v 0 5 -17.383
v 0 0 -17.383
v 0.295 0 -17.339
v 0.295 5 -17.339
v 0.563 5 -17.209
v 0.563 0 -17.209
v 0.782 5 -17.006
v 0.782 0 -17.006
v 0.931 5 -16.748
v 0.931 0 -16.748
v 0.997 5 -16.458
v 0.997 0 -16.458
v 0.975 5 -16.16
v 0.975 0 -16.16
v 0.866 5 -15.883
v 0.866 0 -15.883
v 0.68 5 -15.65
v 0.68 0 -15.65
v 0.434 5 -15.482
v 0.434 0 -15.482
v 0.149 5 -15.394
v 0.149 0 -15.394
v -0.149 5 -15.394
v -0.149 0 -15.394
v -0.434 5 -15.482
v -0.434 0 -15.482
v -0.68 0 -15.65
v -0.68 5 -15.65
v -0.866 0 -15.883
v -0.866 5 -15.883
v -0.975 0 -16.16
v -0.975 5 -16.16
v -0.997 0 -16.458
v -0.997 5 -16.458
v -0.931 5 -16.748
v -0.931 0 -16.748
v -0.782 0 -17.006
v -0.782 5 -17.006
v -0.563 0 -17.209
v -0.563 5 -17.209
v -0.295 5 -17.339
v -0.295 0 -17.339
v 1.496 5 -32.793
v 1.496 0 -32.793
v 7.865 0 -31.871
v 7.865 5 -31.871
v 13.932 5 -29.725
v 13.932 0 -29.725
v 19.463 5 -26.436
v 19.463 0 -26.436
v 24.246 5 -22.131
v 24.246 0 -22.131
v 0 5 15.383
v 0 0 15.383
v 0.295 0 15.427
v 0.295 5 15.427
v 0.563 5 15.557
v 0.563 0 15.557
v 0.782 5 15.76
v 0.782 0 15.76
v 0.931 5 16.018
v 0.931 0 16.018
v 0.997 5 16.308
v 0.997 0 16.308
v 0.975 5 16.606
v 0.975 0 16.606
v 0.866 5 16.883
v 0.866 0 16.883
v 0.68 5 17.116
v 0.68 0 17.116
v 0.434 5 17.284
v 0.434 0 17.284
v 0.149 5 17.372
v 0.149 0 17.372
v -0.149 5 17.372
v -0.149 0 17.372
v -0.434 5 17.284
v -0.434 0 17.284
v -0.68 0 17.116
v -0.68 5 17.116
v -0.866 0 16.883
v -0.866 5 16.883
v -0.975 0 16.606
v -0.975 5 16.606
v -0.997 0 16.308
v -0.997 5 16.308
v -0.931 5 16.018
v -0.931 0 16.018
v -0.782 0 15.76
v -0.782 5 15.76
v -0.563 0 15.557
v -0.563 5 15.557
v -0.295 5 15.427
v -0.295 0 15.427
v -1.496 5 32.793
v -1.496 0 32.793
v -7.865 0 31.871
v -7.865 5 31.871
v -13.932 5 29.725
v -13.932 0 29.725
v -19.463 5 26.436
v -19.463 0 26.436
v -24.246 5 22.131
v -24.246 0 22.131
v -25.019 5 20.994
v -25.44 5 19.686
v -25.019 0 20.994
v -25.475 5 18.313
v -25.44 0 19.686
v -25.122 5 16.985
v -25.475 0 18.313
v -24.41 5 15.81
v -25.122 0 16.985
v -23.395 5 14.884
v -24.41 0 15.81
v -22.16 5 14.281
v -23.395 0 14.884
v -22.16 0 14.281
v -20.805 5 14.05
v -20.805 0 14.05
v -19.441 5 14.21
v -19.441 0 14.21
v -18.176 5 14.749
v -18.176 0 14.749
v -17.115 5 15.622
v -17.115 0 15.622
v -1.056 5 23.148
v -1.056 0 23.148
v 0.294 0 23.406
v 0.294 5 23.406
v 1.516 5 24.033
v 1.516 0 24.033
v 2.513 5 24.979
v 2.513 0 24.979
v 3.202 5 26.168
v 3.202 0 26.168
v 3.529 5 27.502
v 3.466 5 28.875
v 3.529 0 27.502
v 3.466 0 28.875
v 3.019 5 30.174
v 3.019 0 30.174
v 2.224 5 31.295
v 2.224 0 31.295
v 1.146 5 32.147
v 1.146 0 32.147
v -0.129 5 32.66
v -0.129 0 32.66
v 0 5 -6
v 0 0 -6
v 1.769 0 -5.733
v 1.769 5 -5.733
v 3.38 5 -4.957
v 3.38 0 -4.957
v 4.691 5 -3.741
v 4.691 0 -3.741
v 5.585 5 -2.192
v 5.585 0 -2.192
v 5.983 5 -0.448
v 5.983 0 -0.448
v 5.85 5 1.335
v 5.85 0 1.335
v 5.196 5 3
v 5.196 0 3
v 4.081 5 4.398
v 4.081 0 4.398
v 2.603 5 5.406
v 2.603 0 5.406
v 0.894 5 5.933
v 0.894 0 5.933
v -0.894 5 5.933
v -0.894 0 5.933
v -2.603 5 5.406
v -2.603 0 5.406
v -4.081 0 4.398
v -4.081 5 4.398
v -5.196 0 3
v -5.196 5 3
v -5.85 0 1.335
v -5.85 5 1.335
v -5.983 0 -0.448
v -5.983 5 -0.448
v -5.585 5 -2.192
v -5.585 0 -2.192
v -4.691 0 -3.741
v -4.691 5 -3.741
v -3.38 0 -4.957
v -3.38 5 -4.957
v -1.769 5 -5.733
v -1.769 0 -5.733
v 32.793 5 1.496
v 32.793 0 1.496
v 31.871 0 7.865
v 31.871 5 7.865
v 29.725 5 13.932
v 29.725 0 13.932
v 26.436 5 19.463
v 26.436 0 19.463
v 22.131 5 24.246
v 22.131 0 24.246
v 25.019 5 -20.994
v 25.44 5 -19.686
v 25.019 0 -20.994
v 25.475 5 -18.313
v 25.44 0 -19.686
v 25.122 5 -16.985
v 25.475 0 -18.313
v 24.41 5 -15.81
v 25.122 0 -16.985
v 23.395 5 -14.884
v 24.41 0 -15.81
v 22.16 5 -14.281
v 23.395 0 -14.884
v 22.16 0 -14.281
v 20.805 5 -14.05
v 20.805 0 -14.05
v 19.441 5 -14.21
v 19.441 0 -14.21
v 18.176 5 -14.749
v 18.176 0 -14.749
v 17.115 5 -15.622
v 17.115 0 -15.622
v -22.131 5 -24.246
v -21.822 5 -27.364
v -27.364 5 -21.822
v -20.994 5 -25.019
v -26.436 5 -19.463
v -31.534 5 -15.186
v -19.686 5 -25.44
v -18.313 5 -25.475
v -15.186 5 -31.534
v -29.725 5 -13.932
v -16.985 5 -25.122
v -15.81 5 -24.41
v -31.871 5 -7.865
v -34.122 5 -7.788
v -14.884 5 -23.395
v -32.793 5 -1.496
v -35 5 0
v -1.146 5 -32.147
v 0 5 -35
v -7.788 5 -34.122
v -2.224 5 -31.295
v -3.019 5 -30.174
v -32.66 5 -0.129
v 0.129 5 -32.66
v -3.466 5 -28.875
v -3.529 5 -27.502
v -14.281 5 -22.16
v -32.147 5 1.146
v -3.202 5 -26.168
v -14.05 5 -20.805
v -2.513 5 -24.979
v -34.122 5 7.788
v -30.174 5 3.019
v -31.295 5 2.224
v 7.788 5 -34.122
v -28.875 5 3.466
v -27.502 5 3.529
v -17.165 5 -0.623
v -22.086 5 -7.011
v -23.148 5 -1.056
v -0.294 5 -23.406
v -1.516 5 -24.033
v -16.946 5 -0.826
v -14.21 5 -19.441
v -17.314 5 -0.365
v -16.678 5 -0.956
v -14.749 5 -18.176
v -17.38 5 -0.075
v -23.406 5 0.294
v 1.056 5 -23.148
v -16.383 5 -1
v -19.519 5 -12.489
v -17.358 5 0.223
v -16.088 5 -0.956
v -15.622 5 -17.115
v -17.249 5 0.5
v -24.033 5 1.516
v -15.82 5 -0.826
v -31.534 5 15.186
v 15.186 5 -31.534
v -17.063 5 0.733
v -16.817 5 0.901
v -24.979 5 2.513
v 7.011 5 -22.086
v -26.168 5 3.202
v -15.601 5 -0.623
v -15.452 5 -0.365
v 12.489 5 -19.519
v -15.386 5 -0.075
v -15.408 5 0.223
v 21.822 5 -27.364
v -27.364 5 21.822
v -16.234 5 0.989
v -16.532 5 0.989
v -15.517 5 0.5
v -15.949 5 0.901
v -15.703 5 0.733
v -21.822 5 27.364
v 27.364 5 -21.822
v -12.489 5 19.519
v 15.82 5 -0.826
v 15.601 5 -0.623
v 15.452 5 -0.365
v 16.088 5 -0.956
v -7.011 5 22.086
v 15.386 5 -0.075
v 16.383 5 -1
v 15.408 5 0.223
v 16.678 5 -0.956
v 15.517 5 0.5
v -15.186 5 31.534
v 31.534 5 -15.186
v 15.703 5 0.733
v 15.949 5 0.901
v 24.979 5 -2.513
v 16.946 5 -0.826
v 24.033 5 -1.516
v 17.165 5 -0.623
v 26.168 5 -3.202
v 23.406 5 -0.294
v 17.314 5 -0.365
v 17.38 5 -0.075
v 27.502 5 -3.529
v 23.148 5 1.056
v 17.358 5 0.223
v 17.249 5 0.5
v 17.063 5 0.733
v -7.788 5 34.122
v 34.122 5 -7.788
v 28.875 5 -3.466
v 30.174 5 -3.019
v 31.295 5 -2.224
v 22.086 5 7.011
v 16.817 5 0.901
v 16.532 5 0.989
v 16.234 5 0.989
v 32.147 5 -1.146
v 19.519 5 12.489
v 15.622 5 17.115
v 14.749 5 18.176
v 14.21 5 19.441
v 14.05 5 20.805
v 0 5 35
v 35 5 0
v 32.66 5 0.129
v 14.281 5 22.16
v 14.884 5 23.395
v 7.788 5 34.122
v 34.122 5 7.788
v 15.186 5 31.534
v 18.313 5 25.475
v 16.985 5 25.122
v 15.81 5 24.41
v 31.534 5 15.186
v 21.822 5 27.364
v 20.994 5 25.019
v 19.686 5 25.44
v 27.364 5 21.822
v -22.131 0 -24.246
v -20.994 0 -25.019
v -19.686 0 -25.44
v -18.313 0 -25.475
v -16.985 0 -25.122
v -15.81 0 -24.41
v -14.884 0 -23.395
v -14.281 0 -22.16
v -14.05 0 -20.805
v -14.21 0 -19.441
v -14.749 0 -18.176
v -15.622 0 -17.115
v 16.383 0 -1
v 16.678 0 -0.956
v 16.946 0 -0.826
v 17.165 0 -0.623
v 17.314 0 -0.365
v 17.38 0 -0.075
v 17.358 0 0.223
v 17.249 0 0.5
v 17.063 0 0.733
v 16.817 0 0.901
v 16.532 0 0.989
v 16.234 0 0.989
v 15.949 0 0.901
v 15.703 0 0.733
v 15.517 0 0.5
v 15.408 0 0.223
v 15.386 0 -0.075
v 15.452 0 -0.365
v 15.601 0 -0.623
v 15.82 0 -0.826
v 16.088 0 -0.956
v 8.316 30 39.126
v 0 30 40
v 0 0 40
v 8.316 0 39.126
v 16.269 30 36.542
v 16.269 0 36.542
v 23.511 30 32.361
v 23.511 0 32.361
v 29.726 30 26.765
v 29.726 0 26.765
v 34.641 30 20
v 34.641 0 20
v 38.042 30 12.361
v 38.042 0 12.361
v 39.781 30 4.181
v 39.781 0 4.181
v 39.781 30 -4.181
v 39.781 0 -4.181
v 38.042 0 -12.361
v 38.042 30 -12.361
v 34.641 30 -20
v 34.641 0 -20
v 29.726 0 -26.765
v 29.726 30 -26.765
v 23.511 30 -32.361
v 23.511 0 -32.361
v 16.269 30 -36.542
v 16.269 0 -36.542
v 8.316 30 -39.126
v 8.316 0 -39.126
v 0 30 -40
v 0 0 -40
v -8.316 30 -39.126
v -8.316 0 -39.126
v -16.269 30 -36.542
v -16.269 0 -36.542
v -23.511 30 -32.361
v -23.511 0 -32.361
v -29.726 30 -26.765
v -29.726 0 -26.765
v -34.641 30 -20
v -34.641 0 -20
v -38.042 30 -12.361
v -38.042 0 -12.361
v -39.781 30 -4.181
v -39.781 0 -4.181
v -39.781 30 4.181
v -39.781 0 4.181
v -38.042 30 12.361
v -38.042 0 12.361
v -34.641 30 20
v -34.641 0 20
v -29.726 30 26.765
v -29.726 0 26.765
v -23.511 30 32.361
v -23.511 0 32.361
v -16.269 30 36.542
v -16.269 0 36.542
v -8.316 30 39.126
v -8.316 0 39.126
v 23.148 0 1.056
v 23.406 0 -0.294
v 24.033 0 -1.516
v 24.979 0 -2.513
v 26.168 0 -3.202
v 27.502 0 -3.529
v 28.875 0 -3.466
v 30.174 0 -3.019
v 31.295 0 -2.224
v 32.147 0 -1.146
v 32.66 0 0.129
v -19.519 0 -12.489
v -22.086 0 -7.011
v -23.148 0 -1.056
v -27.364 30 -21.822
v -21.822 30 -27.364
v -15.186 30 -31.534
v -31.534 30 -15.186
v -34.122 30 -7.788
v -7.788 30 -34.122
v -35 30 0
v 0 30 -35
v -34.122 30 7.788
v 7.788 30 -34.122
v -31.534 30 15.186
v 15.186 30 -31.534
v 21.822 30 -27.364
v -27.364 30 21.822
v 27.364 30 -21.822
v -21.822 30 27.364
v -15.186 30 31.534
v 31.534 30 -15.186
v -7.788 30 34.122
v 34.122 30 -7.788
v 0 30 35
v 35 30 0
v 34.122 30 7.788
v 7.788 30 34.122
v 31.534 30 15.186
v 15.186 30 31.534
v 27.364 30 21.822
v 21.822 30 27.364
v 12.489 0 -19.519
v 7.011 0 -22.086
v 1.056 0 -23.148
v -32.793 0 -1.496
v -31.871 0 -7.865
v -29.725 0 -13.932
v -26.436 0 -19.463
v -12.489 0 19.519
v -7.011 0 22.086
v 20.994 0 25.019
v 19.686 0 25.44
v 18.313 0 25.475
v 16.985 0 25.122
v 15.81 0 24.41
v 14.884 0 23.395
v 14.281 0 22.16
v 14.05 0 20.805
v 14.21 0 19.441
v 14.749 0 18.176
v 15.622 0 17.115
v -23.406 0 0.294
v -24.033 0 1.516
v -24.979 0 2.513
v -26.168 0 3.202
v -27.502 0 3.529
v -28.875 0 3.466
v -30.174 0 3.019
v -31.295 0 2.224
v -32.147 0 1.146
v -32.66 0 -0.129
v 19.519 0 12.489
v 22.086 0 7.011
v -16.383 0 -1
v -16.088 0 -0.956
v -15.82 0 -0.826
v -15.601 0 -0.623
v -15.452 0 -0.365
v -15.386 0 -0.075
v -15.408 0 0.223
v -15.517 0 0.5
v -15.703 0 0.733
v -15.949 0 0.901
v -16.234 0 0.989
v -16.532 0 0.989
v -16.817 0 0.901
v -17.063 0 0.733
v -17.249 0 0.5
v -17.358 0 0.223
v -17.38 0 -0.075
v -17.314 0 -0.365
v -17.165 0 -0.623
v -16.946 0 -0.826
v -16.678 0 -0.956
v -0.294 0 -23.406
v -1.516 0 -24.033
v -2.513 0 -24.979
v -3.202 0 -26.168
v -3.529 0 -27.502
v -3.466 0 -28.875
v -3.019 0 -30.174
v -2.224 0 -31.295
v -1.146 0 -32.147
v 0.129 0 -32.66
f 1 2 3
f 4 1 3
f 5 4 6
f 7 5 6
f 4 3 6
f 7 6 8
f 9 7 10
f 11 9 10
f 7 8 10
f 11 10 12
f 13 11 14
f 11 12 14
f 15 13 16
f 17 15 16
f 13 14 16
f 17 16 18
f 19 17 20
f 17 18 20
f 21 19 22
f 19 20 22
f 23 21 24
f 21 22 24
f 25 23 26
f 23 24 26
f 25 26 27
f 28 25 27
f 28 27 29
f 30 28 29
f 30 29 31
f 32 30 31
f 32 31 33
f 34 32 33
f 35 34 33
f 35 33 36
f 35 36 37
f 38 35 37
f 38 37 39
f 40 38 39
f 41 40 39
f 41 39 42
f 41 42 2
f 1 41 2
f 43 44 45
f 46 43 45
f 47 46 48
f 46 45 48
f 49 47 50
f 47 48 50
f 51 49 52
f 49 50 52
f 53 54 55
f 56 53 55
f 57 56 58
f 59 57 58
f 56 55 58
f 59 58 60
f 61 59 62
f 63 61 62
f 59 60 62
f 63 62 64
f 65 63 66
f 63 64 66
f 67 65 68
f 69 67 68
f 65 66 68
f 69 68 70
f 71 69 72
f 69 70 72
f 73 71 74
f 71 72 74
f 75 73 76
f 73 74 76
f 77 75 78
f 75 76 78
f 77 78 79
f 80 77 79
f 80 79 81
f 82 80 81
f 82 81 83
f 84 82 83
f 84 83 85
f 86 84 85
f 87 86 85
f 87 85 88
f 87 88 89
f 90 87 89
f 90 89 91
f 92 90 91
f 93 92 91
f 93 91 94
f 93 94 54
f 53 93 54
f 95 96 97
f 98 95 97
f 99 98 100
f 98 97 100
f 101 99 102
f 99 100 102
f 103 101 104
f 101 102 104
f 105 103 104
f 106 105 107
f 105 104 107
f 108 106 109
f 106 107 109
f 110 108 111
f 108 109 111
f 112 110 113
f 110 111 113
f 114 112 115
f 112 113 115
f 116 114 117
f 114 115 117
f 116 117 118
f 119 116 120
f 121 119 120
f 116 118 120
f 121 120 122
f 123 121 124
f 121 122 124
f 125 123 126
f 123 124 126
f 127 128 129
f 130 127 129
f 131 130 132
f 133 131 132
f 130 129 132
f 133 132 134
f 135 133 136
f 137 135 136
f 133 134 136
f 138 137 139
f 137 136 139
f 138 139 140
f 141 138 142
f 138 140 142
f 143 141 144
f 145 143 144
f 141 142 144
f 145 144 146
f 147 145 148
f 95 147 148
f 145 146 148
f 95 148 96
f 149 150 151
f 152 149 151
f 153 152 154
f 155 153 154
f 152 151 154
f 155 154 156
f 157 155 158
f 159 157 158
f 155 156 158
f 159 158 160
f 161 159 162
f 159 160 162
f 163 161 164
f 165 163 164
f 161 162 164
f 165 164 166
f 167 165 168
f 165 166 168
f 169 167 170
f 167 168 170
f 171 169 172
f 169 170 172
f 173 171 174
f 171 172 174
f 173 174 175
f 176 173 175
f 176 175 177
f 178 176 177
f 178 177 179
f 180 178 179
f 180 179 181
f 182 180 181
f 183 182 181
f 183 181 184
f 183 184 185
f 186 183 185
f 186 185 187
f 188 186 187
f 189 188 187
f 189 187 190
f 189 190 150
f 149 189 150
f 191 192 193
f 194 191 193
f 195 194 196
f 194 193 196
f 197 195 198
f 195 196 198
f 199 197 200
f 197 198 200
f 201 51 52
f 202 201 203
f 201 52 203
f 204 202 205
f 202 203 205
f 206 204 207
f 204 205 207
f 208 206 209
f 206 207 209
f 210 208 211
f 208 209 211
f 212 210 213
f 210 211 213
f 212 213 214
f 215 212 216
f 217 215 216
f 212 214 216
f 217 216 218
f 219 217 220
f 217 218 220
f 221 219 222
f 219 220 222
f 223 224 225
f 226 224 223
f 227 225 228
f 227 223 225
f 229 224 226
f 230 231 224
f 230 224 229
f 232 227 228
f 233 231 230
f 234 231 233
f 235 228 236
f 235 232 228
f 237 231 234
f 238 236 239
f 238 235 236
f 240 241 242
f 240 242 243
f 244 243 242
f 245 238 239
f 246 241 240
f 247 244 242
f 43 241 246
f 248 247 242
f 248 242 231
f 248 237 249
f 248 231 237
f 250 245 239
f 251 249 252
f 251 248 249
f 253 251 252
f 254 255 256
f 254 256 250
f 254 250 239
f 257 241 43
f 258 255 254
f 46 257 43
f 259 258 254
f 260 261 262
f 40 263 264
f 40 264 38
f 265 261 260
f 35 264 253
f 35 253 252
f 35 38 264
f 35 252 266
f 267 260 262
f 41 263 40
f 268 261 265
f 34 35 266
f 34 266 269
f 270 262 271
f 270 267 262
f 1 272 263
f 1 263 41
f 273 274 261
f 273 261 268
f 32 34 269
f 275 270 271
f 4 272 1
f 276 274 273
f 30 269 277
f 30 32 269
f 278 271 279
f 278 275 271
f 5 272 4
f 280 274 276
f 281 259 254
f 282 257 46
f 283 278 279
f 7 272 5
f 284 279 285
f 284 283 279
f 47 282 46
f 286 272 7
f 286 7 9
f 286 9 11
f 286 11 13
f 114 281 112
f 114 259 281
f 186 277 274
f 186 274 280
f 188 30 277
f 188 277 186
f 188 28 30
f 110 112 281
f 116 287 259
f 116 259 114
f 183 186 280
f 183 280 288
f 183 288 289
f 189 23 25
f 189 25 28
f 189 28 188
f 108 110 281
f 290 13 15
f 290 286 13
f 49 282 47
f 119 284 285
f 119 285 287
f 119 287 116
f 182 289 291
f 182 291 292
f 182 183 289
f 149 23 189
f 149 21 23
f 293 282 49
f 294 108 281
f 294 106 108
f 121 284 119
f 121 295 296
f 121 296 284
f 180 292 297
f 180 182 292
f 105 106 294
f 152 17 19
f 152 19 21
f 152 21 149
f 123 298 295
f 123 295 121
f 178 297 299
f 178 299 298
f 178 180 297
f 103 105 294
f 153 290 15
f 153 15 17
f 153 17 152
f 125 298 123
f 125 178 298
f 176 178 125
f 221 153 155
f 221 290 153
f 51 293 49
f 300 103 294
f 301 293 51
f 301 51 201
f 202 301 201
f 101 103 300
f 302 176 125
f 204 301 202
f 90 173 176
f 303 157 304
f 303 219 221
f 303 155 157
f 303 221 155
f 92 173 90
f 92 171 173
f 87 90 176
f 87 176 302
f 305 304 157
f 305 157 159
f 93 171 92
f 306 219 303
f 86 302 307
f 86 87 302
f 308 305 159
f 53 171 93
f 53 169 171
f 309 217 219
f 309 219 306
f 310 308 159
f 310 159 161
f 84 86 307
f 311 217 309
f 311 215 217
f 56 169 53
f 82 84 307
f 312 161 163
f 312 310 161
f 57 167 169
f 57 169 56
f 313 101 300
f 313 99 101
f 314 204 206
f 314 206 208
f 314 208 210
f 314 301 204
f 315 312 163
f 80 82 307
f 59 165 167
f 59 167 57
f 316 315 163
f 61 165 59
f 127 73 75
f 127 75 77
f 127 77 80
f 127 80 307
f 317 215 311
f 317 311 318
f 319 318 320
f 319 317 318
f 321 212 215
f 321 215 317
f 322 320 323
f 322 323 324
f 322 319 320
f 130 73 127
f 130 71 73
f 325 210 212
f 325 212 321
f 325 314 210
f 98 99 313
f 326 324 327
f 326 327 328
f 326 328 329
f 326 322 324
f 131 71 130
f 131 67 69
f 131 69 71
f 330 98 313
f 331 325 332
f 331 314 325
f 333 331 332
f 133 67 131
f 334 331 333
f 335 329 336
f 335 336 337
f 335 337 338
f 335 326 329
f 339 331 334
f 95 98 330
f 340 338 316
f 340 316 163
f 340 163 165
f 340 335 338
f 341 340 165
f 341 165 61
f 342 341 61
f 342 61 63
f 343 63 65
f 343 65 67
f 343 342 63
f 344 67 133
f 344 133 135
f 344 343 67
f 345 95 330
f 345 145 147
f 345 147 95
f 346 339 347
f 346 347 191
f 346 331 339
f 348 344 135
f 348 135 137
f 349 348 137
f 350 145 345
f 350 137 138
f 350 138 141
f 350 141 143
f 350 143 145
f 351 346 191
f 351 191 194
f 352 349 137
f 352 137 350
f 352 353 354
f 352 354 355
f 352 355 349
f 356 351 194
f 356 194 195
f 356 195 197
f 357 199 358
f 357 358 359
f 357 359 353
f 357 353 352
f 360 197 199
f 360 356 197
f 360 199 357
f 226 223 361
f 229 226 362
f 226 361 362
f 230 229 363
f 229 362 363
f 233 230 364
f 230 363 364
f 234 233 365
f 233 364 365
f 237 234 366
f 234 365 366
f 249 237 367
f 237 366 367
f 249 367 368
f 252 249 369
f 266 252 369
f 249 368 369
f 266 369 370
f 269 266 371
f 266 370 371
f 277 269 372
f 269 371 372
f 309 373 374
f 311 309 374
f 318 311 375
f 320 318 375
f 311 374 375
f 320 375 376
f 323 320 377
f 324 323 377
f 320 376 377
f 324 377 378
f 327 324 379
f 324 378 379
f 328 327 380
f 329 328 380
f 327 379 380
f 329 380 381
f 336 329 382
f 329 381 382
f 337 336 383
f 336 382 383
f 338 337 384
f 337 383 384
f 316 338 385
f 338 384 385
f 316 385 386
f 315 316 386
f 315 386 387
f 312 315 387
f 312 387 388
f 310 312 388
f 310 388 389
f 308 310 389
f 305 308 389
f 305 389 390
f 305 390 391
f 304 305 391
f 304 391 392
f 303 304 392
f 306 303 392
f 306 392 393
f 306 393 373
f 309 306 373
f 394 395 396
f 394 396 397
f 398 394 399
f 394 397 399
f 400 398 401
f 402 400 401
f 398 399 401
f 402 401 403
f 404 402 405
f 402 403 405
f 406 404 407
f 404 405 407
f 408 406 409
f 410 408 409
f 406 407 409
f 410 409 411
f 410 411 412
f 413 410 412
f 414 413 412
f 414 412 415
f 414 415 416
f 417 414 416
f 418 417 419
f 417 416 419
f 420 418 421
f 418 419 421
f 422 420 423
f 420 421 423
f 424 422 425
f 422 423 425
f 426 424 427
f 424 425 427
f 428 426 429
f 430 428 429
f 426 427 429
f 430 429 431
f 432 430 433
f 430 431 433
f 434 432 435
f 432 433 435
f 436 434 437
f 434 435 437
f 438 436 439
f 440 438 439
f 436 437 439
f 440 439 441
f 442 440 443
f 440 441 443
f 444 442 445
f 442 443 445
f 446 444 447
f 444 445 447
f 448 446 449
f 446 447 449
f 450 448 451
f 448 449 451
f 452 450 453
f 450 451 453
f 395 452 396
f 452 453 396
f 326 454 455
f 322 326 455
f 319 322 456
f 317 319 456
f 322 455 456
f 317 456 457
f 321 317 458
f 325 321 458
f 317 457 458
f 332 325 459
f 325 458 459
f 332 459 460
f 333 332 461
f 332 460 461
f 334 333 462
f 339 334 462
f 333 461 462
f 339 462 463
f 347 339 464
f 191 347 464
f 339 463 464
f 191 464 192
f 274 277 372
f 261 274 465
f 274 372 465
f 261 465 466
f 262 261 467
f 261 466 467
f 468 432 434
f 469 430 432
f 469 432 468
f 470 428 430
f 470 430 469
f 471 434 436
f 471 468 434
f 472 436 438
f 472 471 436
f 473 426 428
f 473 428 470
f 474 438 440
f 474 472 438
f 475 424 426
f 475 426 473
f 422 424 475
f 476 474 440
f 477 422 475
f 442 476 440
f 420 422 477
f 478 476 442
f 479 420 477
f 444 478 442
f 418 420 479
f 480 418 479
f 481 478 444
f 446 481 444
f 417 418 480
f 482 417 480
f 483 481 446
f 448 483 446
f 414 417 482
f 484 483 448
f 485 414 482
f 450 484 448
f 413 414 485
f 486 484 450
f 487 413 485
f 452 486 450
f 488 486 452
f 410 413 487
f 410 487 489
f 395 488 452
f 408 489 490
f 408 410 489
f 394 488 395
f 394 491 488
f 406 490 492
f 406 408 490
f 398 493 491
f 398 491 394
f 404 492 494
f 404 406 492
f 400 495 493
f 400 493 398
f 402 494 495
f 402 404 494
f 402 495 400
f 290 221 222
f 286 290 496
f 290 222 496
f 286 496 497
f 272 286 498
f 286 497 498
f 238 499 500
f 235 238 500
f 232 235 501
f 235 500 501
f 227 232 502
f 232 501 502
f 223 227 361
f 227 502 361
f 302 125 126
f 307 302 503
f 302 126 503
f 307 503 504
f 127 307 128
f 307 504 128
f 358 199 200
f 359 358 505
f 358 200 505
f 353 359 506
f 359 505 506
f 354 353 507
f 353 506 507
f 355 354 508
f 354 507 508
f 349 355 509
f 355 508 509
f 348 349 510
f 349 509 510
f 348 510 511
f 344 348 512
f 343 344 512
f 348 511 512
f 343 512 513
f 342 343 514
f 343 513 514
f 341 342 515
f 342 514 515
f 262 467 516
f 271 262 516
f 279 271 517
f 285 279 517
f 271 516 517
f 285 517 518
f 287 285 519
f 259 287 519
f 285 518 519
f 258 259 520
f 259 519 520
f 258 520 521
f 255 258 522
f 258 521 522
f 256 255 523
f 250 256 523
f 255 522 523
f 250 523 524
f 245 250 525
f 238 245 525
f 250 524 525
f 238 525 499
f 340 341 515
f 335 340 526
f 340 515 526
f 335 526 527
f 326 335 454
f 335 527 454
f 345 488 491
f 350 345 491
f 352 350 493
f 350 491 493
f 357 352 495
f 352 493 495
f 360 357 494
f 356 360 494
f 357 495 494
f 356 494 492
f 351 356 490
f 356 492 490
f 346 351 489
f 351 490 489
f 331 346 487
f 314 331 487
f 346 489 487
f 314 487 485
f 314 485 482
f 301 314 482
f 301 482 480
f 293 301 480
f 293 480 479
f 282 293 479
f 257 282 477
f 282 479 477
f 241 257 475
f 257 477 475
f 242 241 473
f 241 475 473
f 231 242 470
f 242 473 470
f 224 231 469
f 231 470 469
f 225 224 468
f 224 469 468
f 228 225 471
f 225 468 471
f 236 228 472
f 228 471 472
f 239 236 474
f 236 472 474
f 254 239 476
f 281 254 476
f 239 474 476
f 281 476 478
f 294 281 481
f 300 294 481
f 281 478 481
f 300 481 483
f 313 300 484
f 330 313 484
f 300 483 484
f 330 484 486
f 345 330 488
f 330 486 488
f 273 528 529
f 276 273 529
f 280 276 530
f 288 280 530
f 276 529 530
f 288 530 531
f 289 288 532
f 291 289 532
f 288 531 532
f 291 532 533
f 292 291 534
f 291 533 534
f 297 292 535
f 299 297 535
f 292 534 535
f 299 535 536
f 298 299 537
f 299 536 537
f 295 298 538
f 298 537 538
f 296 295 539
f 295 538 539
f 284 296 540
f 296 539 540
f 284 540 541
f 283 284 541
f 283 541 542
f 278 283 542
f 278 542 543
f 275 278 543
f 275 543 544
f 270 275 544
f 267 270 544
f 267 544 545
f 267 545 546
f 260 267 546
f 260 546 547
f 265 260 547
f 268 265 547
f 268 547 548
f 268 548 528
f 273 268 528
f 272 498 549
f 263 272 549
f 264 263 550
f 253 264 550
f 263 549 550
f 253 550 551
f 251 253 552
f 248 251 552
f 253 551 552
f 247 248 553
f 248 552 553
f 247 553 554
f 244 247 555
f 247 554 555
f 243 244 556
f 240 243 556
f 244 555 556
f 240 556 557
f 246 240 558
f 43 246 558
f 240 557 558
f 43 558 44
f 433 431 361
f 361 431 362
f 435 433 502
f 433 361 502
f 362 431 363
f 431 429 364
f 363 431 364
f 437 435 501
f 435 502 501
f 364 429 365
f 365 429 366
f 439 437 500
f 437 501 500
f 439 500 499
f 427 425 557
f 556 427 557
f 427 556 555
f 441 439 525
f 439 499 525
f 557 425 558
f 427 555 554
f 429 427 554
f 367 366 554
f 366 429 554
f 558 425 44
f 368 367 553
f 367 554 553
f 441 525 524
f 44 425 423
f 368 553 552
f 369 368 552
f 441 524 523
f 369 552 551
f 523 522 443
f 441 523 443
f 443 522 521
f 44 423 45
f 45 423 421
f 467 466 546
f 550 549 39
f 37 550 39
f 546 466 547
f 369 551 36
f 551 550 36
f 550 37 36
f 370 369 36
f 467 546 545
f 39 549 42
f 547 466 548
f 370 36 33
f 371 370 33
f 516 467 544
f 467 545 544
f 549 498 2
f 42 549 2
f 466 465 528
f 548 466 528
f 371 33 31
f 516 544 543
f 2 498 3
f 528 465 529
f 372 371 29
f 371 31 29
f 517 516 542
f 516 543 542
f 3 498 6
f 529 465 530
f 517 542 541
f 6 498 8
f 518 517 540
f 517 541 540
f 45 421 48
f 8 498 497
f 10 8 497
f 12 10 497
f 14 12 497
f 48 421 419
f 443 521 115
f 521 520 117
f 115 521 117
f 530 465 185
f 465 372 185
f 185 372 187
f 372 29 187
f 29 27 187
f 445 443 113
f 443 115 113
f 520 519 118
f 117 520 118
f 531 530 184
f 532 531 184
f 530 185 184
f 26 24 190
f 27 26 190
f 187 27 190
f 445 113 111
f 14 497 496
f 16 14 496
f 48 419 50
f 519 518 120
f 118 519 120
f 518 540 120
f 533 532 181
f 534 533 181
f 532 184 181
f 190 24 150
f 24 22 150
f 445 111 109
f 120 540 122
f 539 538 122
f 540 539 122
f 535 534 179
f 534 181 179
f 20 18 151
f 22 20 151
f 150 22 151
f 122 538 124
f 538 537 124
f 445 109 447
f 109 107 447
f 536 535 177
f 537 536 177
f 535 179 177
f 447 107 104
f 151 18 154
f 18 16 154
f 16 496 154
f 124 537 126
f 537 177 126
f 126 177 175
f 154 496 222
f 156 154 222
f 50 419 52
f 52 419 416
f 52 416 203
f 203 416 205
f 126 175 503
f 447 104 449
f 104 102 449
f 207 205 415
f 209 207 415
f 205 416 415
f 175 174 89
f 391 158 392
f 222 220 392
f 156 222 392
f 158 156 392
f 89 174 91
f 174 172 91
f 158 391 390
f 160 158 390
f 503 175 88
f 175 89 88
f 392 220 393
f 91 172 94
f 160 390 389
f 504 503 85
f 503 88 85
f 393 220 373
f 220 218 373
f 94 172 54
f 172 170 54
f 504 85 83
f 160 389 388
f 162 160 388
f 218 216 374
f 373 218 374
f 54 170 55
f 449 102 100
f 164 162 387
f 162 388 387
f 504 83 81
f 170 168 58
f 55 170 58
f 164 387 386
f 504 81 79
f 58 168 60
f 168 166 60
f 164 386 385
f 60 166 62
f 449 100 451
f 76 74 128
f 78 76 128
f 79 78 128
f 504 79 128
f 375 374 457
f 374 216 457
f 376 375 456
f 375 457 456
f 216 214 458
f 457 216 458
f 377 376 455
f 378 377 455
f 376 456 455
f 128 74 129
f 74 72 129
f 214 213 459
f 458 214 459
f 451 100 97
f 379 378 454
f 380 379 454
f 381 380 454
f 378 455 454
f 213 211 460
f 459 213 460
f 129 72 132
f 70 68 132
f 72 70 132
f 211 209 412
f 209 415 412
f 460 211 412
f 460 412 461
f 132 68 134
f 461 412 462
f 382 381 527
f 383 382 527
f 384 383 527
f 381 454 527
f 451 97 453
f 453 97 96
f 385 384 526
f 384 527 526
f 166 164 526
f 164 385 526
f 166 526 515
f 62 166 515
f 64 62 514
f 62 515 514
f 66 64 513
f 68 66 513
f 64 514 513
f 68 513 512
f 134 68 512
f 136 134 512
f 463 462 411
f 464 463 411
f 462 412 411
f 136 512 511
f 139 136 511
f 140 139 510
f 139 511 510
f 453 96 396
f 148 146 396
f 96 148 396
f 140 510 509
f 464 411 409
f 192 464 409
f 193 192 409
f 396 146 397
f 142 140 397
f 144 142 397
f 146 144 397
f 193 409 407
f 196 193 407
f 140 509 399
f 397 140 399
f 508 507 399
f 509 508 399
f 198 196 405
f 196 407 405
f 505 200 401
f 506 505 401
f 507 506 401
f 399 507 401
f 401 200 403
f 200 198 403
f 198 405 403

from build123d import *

# Parameters (mm, degrees)
SKETCH1_R           = 40
BOSS_EXTRUDE1_DEPTH = 30
SKETCH2_R           = 35
CUT_EXTRUDE1_DEPTH  = 25
CUT_EXTRUDE2_REACH  = 66.031
SKETCH4_R           = 6
SKETCH4_R_2         = 1


with BuildPart() as part:
    # Sketch1 → Boss-Extrude1 (new body)
    with BuildSketch(Plane(origin=(0, 0, 0), x_dir=(1, 0, 0), z_dir=(0, 1, 0))):
        with Locations(Location((0, 0, 0), (0, 0, 270))):
            Circle(SKETCH1_R)
    extrude(amount=BOSS_EXTRUDE1_DEPTH)

    # Sketch2 → Cut-Extrude1 (cut)
    with BuildSketch(Plane(origin=(0, 30, 0), x_dir=(1, 0, 0), z_dir=(0, 1, 0))):
        with Locations(Location((0, 0, 0), (0, 0, 270))):
            Circle(SKETCH2_R)
    extrude(amount=-CUT_EXTRUDE1_DEPTH, mode=Mode.SUBTRACT)

    # Sketch4 → Cut-Extrude2 (cut, up to next)
    with BuildSketch(Plane.XZ, mode=Mode.PRIVATE) as cut_extrude2_sk1:
        with Locations(Location((0, 0, 0), (0, 0, 270))):
            Circle(SKETCH4_R)
    cut_extrude2_tool1 = extrude(cut_extrude2_sk1.sketch, amount=-CUT_EXTRUDE2_REACH, mode=Mode.PRIVATE) & part.part
    # Sketch4 → Cut-Extrude2 (cut, up to next)
    with BuildSketch(Plane.XZ, mode=Mode.PRIVATE) as cut_extrude2_sk2:
        with Locations(Location((0, 16.383, 0), (0, 0, 270))):
            Circle(SKETCH4_R_2)
    cut_extrude2_tool2 = extrude(cut_extrude2_sk2.sketch, amount=-CUT_EXTRUDE2_REACH, mode=Mode.PRIVATE) & part.part
    # Sketch4 → Cut-Extrude2 (cut, up to next)
    with BuildSketch(Plane.XZ, mode=Mode.PRIVATE) as cut_extrude2_sk3:
        with Locations(Location((-16.383, 0, 0), (0, 0, 270))):
            Circle(SKETCH4_R_2)
    cut_extrude2_tool3 = extrude(cut_extrude2_sk3.sketch, amount=-CUT_EXTRUDE2_REACH, mode=Mode.PRIVATE) & part.part
    # Sketch4 → Cut-Extrude2 (cut, up to next)
    with BuildSketch(Plane.XZ, mode=Mode.PRIVATE) as cut_extrude2_sk4:
        with Locations(Location((16.383, 0, 0), (0, 0, 270))):
            Circle(SKETCH4_R_2)
    cut_extrude2_tool4 = extrude(cut_extrude2_sk4.sketch, amount=-CUT_EXTRUDE2_REACH, mode=Mode.PRIVATE) & part.part
    # Sketch4 → Cut-Extrude2 (cut, up to next)
    with BuildSketch(Plane.XZ, mode=Mode.PRIVATE) as cut_extrude2_sk5:
        with Locations(Location((0, -16.383, 0), (0, 0, 270))):
            Circle(SKETCH4_R_2)
    cut_extrude2_tool5 = extrude(cut_extrude2_sk5.sketch, amount=-CUT_EXTRUDE2_REACH, mode=Mode.PRIVATE) & part.part
    # Sketch4 → Cut-Extrude2 (cut, up to next)
    with BuildSketch(Plane.XZ, mode=Mode.PRIVATE) as cut_extrude2_sk6:
        with BuildLine():
            ThreePointArc((-1.496156575, 32.793473919), (-13.931787596, 29.72466502), (-24.246430247, 22.130545327))
            ThreePointArc((-24.246430247, 22.130545327), (-23.9352707, 15.31040186), (-17.115127233, 15.621561407))
            ThreePointArc((-17.115127233, 15.621561407), (-9.834203009, 20.982116485), (-1.056110524, 23.148334531))
            ThreePointArc((-1.056110524, 23.148334531), (3.546436145, 28.190927251), (-1.496156575, 32.793473919))
        make_face()
    cut_extrude2_tool6 = extrude(cut_extrude2_sk6.sketch, amount=-CUT_EXTRUDE2_REACH, mode=Mode.PRIVATE) & part.part
    # Sketch4 → Cut-Extrude2 (cut, up to next)
    with BuildSketch(Plane.XZ, mode=Mode.PRIVATE) as cut_extrude2_sk7:
        with BuildLine():
            ThreePointArc((32.793473919, 1.496156575), (29.72466502, 13.931787596), (22.130545327, 24.246430247))
            ThreePointArc((22.130545327, 24.246430247), (15.31040186, 23.9352707), (15.621561407, 17.115127233))
            ThreePointArc((15.621561407, 17.115127233), (20.982116485, 9.834203009), (23.148334531, 1.056110524))
            ThreePointArc((23.148334531, 1.056110524), (28.190927251, -3.546436145), (32.793473919, 1.496156575))
        make_face()
    cut_extrude2_tool7 = extrude(cut_extrude2_sk7.sketch, amount=-CUT_EXTRUDE2_REACH, mode=Mode.PRIVATE) & part.part
    # Sketch4 → Cut-Extrude2 (cut, up to next)
    with BuildSketch(Plane.XZ, mode=Mode.PRIVATE) as cut_extrude2_sk8:
        with BuildLine():
            ThreePointArc((1.496156575, -32.793473919), (13.931787596, -29.72466502), (24.246430247, -22.130545327))
            ThreePointArc((24.246430247, -22.130545327), (23.9352707, -15.31040186), (17.115127233, -15.621561407))
            ThreePointArc((17.115127233, -15.621561407), (9.834203009, -20.982116485), (1.056110524, -23.148334531))
            ThreePointArc((1.056110524, -23.148334531), (-3.546436145, -28.190927251), (1.496156575, -32.793473919))
        make_face()
    cut_extrude2_tool8 = extrude(cut_extrude2_sk8.sketch, amount=-CUT_EXTRUDE2_REACH, mode=Mode.PRIVATE) & part.part
    # Sketch4 → Cut-Extrude2 (cut, up to next)
    with BuildSketch(Plane.XZ, mode=Mode.PRIVATE) as cut_extrude2_sk9:
        with BuildLine():
            ThreePointArc((-32.793473919, -1.496156575), (-29.72466502, -13.931787596), (-22.130545327, -24.246430247))
            ThreePointArc((-22.130545327, -24.246430247), (-15.31040186, -23.9352707), (-15.621561407, -17.115127233))
            ThreePointArc((-15.621561407, -17.115127233), (-20.982116485, -9.834203009), (-23.148334531, -1.056110524))
            ThreePointArc((-23.148334531, -1.056110524), (-28.190927251, 3.546436145), (-32.793473919, -1.496156575))
        make_face()
    cut_extrude2_tool9 = extrude(cut_extrude2_sk9.sketch, amount=-CUT_EXTRUDE2_REACH, mode=Mode.PRIVATE) & part.part
    add(cut_extrude2_tool1.solids().sort_by_distance((0, 0, 0))[0], mode=Mode.SUBTRACT)
    add(cut_extrude2_tool2.solids().sort_by_distance((0, 0, 16.383))[0], mode=Mode.SUBTRACT)
    add(cut_extrude2_tool3.solids().sort_by_distance((-16.383, 0, 0))[0], mode=Mode.SUBTRACT)
    add(cut_extrude2_tool4.solids().sort_by_distance((16.383, 0, 0))[0], mode=Mode.SUBTRACT)
    add(cut_extrude2_tool5.solids().sort_by_distance((0, 0, -16.383))[0], mode=Mode.SUBTRACT)
    add(cut_extrude2_tool6.solids().sort_by_distance((-11.425701, 0, 24.377715))[0], mode=Mode.SUBTRACT)
    add(cut_extrude2_tool7.solids().sort_by_distance((24.377715, 0, 11.425701))[0], mode=Mode.SUBTRACT)
    add(cut_extrude2_tool8.solids().sort_by_distance((11.425701, 0, -24.377715))[0], mode=Mode.SUBTRACT)
    add(cut_extrude2_tool9.solids().sort_by_distance((-24.377715, 0, -11.425701))[0], mode=Mode.SUBTRACT)


solid = part.part
